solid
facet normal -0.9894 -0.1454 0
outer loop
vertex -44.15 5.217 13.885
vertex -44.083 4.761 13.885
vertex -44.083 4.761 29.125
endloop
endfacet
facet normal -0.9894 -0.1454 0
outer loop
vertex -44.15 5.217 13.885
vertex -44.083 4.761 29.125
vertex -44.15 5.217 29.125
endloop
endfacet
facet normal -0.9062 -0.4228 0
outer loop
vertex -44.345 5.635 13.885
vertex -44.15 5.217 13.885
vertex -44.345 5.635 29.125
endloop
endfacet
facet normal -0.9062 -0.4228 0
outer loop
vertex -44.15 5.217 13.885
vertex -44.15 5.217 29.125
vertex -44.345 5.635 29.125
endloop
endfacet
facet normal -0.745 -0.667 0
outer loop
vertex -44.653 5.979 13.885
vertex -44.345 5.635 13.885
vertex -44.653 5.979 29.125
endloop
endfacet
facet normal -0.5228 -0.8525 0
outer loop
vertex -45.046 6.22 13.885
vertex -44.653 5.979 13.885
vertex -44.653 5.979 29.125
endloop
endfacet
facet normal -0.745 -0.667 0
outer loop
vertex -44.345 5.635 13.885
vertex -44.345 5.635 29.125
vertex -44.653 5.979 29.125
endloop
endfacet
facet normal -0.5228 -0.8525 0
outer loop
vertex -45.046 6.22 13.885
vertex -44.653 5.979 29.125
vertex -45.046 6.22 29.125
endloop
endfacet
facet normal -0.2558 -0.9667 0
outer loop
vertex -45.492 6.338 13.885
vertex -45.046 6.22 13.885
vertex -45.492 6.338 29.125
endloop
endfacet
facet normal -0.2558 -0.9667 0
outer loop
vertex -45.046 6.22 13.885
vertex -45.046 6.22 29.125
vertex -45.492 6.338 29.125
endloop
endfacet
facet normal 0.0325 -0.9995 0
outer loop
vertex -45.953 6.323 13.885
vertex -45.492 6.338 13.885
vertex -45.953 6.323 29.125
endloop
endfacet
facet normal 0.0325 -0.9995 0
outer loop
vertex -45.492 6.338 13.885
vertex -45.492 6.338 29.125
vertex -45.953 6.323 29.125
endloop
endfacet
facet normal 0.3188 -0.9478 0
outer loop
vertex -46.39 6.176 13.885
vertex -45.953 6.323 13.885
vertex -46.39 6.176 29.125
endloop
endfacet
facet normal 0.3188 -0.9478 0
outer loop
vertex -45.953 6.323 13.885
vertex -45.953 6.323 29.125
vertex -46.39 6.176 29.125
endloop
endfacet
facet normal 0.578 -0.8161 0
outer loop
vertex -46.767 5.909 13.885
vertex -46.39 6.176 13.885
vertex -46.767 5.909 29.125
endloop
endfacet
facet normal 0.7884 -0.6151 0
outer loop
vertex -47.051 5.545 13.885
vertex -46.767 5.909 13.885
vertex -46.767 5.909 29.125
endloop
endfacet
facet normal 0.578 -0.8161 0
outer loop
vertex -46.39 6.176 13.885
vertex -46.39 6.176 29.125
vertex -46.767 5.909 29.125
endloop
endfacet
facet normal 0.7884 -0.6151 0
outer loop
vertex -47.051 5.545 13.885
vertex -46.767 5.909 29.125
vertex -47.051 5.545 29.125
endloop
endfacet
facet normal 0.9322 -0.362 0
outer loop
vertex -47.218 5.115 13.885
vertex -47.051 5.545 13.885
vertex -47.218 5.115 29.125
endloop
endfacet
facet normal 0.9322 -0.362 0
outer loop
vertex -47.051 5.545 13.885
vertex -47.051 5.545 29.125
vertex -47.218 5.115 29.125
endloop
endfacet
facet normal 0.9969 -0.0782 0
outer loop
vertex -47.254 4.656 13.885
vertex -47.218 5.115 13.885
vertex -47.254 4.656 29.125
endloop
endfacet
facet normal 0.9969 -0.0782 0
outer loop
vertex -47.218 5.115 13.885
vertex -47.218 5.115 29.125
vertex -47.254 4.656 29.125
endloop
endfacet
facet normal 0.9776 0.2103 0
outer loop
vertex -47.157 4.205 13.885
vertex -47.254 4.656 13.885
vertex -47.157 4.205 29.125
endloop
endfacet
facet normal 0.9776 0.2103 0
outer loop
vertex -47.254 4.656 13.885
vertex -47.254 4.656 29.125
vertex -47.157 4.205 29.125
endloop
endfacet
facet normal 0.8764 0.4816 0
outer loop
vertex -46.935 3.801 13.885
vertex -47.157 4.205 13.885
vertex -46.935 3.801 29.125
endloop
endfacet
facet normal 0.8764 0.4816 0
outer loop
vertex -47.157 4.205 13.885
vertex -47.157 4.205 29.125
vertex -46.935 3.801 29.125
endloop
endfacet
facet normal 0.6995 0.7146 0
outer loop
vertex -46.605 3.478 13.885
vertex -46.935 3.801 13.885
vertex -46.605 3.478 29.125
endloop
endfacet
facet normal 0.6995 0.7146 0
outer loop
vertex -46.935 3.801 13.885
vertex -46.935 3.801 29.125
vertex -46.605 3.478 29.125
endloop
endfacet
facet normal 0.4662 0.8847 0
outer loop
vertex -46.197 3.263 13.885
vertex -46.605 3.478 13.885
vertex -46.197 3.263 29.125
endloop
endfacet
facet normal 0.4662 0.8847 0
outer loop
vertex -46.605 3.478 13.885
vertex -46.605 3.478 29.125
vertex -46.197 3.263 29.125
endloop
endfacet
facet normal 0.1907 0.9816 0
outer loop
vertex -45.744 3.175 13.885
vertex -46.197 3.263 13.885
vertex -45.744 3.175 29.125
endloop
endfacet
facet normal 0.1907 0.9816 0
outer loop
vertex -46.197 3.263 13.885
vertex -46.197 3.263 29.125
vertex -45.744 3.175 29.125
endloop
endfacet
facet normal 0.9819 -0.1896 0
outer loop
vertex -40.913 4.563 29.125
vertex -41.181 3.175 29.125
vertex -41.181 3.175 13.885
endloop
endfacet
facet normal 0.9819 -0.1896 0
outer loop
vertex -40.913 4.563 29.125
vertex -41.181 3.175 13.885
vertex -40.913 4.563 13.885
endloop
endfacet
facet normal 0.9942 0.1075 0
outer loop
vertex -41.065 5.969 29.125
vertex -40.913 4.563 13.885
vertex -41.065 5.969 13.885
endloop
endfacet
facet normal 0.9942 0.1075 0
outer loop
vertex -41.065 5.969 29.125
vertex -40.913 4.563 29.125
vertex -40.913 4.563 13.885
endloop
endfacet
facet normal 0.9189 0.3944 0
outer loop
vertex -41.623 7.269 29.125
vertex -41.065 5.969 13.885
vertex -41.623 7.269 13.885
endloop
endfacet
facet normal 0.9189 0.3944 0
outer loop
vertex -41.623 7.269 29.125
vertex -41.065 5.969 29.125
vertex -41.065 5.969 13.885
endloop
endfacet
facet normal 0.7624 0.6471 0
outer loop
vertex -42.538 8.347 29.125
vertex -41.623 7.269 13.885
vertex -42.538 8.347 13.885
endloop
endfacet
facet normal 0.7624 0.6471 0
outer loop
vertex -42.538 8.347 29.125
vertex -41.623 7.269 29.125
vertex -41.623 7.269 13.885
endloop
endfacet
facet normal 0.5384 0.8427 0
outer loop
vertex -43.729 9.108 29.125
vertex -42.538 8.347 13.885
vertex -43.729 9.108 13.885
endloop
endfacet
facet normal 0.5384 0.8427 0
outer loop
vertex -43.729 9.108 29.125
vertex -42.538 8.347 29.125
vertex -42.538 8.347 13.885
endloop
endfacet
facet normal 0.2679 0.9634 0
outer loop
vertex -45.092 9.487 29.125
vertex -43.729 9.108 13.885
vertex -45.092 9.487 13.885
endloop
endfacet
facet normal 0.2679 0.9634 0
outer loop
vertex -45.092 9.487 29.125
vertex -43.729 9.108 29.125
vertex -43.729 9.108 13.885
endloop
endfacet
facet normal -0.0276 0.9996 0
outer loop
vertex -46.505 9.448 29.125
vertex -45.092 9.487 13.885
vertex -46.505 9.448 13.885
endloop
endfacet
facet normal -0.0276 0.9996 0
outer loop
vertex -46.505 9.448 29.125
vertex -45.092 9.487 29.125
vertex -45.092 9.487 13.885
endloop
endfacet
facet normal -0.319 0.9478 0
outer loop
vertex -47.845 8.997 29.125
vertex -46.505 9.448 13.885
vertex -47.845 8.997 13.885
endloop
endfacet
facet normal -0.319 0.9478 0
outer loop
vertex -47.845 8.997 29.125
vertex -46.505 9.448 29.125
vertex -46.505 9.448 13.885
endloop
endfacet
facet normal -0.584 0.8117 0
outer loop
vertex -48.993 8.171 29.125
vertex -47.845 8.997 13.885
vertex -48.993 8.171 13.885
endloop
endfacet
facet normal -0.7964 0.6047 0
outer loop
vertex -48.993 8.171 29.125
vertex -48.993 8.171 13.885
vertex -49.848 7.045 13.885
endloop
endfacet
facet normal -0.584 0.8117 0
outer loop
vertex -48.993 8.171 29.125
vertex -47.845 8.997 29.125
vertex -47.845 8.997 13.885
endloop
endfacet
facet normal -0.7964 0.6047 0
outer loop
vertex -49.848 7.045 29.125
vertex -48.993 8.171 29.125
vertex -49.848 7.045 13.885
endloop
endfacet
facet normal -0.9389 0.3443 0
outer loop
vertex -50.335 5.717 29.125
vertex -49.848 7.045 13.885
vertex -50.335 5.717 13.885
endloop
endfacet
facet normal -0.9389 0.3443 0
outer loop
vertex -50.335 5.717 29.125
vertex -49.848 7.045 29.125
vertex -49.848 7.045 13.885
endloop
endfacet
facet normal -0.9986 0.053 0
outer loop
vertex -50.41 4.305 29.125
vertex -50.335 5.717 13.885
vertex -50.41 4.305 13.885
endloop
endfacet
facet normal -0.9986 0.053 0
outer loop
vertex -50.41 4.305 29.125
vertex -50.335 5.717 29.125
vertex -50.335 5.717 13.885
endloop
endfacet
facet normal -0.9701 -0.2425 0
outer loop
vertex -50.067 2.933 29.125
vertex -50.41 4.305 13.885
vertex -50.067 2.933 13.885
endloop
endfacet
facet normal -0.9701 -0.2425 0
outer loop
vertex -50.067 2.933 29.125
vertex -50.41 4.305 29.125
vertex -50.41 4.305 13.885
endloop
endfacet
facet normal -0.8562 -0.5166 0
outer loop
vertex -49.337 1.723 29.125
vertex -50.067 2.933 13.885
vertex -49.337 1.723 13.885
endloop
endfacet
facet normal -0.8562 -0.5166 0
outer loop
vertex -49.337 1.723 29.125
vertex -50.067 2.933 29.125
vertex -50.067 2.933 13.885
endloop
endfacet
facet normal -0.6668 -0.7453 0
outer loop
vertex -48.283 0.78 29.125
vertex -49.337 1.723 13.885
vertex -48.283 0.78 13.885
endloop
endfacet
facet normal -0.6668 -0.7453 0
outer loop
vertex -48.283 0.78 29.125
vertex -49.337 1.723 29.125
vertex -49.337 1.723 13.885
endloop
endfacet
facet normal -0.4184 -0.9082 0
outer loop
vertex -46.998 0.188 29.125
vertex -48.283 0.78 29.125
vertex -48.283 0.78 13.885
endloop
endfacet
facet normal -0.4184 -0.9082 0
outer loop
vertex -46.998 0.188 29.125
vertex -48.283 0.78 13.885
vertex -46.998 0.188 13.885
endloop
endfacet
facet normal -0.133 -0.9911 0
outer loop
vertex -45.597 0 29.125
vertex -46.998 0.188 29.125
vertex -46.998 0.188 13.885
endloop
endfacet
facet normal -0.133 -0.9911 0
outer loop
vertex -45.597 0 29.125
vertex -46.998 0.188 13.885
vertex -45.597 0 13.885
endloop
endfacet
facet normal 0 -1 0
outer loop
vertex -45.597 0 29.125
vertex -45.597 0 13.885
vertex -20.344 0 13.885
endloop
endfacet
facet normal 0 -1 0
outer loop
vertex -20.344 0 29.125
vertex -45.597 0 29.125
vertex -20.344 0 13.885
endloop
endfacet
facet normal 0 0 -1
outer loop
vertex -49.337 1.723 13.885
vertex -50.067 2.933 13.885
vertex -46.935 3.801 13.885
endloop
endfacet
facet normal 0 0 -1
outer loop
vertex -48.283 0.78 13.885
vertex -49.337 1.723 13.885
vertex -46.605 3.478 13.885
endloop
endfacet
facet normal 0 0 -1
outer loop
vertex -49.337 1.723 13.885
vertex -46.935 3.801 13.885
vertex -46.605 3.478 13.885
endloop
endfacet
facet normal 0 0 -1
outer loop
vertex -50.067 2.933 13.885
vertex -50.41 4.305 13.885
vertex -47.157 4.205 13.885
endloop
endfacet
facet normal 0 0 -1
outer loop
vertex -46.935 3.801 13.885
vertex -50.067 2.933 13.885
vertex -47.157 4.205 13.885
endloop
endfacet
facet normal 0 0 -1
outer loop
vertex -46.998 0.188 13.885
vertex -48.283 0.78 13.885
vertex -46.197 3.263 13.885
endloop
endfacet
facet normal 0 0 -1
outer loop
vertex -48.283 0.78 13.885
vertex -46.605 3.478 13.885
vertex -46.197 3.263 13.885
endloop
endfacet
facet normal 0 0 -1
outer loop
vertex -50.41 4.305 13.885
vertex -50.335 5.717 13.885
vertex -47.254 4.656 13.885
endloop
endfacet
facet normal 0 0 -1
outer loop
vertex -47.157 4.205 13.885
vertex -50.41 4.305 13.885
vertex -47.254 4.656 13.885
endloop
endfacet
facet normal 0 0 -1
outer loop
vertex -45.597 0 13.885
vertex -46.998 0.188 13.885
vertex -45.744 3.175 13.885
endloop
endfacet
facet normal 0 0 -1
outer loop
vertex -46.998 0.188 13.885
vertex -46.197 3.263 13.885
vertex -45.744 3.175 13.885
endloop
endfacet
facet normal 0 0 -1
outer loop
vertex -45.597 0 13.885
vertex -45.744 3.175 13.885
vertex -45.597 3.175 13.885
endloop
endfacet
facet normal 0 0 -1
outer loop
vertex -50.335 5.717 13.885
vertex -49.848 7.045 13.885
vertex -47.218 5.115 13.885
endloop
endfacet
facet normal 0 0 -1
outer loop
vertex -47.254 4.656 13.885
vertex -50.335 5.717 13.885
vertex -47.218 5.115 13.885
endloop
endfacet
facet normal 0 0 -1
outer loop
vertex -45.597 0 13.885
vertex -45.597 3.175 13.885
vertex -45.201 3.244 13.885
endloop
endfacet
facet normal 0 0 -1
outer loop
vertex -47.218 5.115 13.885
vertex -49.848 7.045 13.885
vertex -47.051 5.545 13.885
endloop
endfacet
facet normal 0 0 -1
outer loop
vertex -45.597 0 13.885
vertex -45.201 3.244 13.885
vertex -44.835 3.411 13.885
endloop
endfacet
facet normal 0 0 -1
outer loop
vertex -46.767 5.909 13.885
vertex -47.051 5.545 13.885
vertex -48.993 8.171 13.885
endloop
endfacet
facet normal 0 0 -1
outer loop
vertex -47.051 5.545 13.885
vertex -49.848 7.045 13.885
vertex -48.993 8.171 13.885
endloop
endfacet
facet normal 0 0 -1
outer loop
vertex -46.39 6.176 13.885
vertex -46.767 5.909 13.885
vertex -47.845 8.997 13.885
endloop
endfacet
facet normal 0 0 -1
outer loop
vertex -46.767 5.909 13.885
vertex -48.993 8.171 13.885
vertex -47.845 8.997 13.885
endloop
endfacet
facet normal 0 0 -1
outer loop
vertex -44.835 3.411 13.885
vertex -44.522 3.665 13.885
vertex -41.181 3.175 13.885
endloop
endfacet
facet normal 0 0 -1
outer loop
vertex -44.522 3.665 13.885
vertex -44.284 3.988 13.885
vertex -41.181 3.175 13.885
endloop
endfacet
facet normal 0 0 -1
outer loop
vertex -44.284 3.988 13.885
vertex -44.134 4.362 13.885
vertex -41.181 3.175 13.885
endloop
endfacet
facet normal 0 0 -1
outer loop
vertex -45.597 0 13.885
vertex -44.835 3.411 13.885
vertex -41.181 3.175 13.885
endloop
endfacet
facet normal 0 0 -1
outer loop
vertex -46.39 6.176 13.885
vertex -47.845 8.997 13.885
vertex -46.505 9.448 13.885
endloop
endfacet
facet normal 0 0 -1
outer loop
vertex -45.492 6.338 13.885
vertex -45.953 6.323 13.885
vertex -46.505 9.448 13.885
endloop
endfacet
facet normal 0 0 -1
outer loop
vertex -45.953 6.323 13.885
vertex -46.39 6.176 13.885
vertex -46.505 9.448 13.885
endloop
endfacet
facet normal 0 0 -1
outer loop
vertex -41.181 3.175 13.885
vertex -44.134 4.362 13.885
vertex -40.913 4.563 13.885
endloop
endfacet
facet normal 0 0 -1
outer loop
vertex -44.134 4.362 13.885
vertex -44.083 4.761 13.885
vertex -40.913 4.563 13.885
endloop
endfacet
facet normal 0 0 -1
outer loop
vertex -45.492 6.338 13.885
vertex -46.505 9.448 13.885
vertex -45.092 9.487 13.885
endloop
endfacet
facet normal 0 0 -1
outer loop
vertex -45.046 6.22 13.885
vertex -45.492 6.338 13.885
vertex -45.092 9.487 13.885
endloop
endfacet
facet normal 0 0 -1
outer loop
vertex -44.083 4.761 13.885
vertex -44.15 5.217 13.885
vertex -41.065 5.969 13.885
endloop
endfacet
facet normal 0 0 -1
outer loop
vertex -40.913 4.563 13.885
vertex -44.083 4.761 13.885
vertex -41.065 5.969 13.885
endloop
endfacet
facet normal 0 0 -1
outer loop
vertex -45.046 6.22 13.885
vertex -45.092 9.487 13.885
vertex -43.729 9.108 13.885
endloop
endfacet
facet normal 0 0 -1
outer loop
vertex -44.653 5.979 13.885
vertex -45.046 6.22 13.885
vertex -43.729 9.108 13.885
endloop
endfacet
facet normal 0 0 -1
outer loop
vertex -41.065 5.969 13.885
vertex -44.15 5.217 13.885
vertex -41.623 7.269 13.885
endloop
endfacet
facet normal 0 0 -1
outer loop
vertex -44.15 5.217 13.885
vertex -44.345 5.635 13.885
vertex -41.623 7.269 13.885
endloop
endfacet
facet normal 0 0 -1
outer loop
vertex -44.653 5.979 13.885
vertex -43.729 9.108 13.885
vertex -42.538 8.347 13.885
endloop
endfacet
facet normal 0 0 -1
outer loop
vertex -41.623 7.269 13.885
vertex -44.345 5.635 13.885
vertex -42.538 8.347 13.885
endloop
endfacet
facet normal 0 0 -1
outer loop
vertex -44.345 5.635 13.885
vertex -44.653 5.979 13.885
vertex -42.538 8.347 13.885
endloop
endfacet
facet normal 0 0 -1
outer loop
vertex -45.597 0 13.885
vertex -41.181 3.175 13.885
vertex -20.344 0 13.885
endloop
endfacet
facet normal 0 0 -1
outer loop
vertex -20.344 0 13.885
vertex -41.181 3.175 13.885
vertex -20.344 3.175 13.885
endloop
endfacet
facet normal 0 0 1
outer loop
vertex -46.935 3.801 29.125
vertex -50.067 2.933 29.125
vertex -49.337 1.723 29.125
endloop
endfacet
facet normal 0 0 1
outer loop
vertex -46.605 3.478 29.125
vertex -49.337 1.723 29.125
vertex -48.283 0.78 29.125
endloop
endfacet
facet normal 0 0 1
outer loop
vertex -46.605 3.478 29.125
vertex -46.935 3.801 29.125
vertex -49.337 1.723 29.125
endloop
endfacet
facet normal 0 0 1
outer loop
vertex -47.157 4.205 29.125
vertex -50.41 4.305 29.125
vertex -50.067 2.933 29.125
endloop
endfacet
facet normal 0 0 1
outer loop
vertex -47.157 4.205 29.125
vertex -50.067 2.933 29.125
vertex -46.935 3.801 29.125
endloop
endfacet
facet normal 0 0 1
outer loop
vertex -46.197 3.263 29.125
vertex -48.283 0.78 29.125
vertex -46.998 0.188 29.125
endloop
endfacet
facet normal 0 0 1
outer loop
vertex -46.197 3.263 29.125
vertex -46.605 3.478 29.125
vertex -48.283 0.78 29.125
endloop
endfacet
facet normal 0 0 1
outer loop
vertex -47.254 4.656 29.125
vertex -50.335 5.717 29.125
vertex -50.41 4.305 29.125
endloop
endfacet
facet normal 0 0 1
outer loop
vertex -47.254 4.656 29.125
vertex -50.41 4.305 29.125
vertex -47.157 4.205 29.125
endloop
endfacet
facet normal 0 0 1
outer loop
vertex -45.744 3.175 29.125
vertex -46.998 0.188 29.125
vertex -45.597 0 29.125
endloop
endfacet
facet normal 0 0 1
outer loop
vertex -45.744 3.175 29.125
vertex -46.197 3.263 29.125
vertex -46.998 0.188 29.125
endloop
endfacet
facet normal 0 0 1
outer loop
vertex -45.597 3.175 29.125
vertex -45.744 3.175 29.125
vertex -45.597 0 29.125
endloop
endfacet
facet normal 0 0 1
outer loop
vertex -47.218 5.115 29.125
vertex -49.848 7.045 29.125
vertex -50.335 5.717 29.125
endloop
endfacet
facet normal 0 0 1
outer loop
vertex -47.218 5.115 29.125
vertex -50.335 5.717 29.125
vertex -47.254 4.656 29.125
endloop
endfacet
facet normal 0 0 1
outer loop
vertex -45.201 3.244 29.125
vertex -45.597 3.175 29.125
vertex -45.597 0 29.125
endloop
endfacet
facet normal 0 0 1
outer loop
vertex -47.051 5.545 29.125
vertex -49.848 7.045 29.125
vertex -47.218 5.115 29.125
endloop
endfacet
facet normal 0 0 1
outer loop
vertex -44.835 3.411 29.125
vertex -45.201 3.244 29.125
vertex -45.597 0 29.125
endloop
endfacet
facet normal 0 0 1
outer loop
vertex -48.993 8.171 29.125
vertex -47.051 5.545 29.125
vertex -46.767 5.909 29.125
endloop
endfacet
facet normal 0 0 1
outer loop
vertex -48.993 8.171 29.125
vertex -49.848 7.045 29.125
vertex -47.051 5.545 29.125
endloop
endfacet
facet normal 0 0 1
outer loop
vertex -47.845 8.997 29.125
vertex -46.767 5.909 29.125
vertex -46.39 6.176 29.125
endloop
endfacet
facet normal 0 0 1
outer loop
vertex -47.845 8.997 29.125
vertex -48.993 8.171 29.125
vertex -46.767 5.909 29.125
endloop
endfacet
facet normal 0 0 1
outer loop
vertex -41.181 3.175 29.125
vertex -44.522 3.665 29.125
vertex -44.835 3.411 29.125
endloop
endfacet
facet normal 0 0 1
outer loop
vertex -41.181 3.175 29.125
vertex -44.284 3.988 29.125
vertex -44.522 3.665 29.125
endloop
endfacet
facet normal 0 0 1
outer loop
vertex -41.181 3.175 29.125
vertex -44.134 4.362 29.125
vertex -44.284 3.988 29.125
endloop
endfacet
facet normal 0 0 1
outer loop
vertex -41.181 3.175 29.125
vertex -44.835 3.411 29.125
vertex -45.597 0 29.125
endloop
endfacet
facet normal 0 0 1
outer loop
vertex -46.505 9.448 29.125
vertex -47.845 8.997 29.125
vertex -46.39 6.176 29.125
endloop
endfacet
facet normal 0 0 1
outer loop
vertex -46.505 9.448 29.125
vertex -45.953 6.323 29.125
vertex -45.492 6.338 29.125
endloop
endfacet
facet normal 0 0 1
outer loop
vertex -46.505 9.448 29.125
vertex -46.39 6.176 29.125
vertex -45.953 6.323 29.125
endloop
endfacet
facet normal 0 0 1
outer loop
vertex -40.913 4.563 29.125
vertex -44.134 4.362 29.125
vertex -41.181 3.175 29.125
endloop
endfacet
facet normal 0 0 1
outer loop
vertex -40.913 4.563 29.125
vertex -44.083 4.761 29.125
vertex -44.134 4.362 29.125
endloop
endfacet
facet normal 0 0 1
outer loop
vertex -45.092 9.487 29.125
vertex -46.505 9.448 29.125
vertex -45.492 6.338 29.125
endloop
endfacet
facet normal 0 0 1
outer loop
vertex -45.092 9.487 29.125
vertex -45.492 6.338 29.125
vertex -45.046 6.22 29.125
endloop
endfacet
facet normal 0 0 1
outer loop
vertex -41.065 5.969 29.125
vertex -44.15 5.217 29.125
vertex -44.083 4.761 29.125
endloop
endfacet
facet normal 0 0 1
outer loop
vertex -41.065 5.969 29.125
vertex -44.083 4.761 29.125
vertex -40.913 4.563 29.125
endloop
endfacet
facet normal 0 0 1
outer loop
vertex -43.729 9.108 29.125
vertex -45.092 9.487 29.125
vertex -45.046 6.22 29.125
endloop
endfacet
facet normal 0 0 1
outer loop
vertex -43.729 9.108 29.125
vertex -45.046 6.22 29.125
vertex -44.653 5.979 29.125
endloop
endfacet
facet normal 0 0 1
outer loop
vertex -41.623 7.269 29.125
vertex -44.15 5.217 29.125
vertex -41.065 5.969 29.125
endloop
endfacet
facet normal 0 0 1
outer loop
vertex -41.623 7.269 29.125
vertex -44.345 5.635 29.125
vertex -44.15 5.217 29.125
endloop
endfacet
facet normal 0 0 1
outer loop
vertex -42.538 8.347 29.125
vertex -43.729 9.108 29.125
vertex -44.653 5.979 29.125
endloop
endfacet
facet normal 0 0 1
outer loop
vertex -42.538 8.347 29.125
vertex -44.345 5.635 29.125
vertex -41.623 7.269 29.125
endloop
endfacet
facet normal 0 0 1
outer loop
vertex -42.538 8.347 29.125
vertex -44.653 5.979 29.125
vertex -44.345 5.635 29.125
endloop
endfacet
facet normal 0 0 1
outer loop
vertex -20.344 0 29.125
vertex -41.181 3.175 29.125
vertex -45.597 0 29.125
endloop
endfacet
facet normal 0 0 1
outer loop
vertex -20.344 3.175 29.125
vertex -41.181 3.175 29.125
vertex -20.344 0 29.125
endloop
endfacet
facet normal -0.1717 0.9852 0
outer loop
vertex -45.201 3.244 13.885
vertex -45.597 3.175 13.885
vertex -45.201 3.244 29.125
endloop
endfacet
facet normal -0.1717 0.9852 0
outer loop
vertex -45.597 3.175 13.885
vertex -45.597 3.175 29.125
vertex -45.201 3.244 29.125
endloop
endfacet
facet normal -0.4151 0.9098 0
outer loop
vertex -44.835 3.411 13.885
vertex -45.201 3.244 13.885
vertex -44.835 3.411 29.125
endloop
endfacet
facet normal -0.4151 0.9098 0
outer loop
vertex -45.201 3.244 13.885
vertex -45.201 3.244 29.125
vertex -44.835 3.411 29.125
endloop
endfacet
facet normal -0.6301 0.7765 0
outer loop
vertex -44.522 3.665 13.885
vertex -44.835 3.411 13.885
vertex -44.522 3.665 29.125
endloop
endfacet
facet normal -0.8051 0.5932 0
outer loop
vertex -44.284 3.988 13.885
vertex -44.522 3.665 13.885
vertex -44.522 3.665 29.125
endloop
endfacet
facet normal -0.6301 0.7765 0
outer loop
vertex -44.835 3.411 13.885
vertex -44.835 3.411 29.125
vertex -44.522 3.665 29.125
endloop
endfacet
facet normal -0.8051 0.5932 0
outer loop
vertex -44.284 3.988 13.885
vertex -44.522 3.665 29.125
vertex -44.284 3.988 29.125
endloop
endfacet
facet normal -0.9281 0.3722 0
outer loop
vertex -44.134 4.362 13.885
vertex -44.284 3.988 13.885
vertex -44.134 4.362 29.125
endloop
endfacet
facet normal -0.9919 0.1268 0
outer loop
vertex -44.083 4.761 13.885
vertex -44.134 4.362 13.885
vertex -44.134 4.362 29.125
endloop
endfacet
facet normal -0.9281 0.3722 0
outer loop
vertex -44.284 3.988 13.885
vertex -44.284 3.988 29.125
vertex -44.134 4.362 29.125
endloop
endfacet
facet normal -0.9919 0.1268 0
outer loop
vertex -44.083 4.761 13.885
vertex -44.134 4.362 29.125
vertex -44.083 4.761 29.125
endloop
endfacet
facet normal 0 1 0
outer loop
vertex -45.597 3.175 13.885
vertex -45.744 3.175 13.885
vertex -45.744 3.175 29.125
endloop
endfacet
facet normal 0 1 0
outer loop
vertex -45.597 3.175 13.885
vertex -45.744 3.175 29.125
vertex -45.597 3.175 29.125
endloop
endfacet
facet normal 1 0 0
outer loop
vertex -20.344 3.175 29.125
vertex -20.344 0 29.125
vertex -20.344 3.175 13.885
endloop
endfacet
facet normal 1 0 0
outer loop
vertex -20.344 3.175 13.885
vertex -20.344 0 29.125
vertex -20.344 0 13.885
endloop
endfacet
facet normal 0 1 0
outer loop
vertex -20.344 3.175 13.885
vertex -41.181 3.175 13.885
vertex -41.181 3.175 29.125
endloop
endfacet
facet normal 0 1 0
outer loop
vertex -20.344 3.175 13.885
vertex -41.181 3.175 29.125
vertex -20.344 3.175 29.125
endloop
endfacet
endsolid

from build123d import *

# Parameters (mm, degrees)
SKETCH1_W           = 25.4
SKETCH1_H           = 15.24
BOSS_EXTRUDE1_DEPTH = 3.175
SKETCH3_R           = 4.761366165
SKETCH3_R_2         = 1.5875
BOSS_EXTRUDE2_DEPTH = 15.24


with BuildPart() as part:
    # Sketch1 → Boss-Extrude1 (new body)
    with BuildSketch(Plane(origin=(0, 0, 0), x_dir=(1, 0, 0), z_dir=(0, 1, 0))):
        with Locations((-33.04393404, -21.504734982)):
            Rectangle(SKETCH1_W, SKETCH1_H)
    extrude(amount=BOSS_EXTRUDE1_DEPTH)

    # Sketch3 → Boss-Extrude2 (add)
    with BuildSketch(Plane.XY.offset(29.124734982)):
        with Locations((-45.670474152, 4.76079945)):
            Circle(SKETCH3_R)
        with Locations((-45.670474152, 4.76079945)):
            Circle(SKETCH3_R_2, mode=Mode.SUBTRACT)
    extrude(amount=-BOSS_EXTRUDE2_DEPTH)


solid = part.part
